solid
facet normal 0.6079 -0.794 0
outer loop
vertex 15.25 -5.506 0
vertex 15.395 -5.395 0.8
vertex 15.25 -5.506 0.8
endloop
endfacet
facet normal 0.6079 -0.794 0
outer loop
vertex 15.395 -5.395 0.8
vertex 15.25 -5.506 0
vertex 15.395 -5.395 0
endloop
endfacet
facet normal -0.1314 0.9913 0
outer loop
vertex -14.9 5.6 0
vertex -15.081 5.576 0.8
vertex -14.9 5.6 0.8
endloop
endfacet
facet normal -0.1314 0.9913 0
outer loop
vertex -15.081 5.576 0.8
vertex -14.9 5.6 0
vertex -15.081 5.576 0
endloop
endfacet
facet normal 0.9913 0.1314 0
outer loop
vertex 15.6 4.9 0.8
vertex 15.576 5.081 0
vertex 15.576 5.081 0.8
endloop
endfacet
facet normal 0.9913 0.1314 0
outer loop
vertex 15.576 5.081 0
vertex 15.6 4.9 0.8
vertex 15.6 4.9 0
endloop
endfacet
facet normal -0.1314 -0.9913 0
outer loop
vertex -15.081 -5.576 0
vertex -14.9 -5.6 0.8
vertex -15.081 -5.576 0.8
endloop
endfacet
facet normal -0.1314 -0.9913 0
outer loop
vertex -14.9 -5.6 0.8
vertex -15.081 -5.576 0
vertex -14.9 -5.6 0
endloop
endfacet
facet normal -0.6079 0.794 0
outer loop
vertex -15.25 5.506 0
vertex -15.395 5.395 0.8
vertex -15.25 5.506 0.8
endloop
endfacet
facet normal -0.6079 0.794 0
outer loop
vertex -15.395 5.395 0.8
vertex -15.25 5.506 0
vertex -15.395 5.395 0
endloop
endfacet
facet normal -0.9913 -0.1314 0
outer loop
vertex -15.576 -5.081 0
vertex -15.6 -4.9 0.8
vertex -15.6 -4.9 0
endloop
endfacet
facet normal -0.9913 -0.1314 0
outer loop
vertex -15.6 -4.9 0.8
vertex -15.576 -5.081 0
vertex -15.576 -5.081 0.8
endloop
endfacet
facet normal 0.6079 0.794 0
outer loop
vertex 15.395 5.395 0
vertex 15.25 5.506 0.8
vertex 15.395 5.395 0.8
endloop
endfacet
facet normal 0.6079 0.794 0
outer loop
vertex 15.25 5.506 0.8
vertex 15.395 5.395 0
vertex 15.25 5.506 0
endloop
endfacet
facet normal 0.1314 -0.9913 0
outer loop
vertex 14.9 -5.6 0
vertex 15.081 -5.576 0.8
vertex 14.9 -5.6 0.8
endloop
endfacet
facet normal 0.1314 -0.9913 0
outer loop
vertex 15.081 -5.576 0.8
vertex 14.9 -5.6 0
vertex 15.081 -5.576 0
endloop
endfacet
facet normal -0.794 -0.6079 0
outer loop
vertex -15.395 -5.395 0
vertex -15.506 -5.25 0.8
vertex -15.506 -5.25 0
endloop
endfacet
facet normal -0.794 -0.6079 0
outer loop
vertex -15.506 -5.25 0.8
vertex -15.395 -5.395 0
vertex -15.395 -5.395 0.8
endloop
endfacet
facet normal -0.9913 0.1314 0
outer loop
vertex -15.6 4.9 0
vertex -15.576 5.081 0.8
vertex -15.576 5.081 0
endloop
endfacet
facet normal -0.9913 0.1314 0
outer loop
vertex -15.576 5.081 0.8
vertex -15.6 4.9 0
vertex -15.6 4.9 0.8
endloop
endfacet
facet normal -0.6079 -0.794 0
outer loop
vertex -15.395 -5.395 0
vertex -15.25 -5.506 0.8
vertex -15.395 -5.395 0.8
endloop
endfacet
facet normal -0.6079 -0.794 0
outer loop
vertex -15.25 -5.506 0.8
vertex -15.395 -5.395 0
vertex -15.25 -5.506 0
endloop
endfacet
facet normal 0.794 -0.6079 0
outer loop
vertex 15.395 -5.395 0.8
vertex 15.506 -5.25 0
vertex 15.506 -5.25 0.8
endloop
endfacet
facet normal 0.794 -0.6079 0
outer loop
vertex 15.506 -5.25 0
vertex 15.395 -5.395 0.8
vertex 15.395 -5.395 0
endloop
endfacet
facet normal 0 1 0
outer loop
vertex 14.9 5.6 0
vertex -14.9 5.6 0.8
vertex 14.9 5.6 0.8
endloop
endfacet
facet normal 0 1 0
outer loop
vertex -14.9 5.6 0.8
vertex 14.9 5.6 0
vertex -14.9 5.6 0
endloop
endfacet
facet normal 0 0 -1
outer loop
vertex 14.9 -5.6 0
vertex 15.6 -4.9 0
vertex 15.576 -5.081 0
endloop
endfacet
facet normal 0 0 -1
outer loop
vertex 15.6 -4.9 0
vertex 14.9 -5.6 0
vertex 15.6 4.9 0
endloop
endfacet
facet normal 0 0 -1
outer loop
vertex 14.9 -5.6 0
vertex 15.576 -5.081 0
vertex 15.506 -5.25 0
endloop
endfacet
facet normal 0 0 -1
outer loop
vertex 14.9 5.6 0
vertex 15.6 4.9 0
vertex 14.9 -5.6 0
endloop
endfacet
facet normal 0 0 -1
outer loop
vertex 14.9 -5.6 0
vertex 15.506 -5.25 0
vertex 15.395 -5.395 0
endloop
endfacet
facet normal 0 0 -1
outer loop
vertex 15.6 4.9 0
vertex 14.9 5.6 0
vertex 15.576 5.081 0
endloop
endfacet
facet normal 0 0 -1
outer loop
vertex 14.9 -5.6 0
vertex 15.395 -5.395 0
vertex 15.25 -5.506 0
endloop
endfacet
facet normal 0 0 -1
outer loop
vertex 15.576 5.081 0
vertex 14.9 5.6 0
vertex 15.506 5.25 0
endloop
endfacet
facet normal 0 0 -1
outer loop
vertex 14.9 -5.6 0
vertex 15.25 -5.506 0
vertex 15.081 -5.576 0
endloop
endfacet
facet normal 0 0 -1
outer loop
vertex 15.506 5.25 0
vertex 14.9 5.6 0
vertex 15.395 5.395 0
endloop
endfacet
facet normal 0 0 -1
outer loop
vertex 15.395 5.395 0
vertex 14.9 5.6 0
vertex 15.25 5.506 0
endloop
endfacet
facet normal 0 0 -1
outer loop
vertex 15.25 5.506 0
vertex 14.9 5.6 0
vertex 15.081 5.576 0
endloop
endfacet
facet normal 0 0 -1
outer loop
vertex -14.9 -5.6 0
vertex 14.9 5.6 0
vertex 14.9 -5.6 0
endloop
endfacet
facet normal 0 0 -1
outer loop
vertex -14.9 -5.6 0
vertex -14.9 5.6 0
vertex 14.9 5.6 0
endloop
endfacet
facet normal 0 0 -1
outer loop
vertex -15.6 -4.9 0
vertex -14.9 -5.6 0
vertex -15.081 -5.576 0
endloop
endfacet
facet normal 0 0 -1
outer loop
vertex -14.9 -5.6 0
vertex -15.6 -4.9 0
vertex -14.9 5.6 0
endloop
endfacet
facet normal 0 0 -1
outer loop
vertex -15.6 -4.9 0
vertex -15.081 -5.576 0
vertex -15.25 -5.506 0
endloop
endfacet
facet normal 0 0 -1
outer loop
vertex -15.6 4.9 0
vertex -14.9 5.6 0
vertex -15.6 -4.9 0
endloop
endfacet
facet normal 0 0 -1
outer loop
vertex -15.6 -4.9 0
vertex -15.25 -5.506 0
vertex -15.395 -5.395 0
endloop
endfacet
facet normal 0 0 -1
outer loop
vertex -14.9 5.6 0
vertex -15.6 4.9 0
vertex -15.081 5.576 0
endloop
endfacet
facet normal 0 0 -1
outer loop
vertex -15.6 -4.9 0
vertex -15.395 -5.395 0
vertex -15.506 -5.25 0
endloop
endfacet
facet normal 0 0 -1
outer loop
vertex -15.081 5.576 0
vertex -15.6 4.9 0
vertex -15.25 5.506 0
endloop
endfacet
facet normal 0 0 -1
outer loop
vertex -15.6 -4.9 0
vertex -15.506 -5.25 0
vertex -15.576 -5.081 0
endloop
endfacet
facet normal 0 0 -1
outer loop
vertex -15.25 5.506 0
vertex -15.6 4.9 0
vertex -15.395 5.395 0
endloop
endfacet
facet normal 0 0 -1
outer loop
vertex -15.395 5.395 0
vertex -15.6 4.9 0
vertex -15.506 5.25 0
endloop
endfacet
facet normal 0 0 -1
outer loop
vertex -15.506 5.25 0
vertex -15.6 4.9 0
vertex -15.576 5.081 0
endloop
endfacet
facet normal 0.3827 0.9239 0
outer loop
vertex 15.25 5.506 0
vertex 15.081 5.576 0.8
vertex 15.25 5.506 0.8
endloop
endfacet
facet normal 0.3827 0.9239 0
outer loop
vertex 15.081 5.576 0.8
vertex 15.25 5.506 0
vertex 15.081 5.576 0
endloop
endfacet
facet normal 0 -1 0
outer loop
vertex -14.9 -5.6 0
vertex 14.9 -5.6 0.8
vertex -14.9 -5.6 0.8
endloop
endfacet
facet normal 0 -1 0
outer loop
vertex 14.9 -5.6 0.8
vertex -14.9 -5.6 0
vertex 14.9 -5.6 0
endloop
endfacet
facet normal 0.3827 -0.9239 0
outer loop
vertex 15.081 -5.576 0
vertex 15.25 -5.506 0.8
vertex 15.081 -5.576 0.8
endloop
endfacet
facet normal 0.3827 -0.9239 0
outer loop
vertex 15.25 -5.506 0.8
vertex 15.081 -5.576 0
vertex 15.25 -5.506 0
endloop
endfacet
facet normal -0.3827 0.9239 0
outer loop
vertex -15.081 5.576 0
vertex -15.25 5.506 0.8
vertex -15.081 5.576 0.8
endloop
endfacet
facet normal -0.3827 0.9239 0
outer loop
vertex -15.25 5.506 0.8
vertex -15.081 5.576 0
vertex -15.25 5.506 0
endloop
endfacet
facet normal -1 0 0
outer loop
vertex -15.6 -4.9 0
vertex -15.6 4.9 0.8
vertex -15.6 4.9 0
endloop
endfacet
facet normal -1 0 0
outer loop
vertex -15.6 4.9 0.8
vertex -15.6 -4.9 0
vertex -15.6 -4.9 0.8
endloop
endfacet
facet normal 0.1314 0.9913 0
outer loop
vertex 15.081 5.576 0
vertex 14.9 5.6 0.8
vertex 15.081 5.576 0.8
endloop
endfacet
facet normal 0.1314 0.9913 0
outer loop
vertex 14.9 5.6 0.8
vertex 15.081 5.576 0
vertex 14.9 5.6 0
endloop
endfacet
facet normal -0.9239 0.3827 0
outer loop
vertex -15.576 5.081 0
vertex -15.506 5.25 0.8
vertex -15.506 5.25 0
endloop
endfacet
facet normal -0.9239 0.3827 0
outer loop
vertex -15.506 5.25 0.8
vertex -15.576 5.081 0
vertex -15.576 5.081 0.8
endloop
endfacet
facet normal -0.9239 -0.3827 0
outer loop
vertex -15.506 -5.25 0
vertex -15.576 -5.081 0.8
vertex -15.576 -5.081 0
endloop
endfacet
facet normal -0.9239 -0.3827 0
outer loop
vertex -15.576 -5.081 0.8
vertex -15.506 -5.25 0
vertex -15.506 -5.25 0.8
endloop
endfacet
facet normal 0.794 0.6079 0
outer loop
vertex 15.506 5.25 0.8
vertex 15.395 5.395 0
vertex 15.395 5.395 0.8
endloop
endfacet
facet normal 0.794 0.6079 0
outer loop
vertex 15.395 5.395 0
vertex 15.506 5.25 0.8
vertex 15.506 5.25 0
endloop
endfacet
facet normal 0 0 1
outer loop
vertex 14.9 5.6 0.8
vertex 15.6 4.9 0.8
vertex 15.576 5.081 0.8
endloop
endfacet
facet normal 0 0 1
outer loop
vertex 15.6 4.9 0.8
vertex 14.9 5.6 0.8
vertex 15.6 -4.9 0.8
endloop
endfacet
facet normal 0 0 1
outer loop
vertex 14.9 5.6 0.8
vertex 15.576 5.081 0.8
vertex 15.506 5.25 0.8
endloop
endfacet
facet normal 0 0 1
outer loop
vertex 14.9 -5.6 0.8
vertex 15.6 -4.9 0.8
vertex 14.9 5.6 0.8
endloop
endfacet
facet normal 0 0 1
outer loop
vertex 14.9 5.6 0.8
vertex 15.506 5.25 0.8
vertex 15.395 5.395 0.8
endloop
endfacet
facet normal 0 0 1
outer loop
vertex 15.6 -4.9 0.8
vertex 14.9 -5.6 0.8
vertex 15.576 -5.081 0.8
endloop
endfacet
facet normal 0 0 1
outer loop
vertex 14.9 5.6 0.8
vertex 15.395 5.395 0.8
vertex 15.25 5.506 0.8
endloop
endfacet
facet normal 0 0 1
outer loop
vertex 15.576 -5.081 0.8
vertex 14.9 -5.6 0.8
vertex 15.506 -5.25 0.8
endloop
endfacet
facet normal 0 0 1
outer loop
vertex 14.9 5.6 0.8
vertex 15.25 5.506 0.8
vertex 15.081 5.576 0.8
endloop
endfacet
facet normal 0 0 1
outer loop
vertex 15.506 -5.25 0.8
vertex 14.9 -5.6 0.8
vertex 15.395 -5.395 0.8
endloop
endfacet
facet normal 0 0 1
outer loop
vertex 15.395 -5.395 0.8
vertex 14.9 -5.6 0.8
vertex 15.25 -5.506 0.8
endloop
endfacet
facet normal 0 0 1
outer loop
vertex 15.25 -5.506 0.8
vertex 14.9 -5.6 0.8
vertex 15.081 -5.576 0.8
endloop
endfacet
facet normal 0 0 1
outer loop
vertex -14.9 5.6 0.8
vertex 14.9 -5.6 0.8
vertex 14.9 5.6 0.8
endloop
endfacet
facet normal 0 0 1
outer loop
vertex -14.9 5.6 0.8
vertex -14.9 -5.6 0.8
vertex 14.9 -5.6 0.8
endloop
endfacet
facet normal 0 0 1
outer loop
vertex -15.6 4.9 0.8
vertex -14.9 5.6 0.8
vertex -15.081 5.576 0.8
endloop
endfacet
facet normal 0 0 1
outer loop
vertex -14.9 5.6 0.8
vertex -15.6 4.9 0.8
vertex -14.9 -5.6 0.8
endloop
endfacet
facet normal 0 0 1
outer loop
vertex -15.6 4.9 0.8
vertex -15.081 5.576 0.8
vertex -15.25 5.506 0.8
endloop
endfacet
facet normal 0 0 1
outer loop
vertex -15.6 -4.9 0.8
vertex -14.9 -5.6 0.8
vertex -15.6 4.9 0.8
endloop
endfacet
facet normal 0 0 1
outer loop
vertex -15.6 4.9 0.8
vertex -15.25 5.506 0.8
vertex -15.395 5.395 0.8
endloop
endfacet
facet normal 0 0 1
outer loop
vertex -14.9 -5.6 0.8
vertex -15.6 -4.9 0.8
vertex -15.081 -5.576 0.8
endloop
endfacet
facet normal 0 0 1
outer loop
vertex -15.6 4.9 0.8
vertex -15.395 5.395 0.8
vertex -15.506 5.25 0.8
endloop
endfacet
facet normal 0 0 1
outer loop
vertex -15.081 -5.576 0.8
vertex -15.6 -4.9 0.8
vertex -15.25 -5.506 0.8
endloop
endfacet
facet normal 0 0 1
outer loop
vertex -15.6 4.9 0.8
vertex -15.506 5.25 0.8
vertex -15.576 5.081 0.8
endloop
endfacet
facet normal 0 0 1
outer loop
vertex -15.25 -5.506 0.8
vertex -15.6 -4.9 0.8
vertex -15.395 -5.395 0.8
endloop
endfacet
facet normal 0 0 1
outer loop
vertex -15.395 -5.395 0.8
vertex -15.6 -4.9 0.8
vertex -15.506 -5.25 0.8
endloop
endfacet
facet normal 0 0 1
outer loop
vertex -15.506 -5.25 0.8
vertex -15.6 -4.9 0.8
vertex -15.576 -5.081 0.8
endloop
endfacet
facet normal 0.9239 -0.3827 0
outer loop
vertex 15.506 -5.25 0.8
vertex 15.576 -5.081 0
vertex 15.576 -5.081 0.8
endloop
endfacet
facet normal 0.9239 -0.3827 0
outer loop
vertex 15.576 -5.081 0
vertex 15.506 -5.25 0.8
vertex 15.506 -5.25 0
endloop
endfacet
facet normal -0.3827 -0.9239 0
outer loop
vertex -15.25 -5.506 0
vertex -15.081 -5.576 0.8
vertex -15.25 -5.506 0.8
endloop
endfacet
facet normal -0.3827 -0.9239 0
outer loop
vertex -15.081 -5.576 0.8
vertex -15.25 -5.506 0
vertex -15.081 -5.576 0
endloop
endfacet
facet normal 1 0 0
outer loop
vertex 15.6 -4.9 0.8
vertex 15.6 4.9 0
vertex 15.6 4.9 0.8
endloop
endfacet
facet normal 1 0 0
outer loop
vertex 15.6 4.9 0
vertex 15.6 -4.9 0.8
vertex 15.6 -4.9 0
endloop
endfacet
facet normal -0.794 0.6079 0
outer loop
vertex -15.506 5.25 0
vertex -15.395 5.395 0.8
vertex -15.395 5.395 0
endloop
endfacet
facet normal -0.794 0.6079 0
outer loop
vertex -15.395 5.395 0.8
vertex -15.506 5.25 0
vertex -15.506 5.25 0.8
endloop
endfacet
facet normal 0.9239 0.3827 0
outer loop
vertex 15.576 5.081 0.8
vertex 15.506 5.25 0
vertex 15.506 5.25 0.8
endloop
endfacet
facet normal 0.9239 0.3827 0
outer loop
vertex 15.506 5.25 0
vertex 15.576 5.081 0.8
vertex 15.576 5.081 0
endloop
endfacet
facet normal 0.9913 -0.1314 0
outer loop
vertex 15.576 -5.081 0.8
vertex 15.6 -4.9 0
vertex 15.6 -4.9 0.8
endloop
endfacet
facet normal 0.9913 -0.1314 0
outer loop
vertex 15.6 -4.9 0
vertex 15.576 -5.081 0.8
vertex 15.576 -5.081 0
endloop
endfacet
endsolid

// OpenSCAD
// Soft Frame drawer label: MakerWorld customizer (OnBrandCraftz, 2026-11-12).
// Type your own text; it is inlaid flush in a second colour and sized to fit the
// drawer's label window. The label is the shipped blank's exact size, 31.2 x 11.2 x
// 0.8 mm, so it slides into the same pocket. Print flat, text up, supports off,
// 0.2 mm layers.

/* [Your label] */
// The text on the label (one line; long text gets smaller, then narrower)
LABEL_TEXT = "Screws";

/* [Colours] */
// The label
LABEL_COLOUR = "#F4F1EA"; // color
// The text
TEXT_COLOUR = "#2E3440"; // color

/* [Hidden] */
// Why these numbers (Soft_Frame.scad):
// - The pocket is 32 x 12 x 1.5 and its front window 30 x 10. The label stays the
//   blank's 31.2 x 11.2 x 0.8, so the fit is unchanged.
// - The text is a flush inlay, the top two layers (0.4 mm), not raised: nothing
//   stands proud to catch the window's edge as the label slides down the pocket.
// - The text box is 26 x 7 mm, inside the window with 2 mm a side spare. It is
//   centred in the window even when the label sits 0.4 to one side of its pocket.
// - Montserrat Bold, which MakerWorld's Parametric Model Maker has: an unknown
//   font draws nothing and gives no error (the Name Ornament, 2026-11-05).
// - The width rule uses Montserrat Bold's own advances, measured in OpenSCAD
//   (PMM's build may not have textmetrics()). Down to cap height 3 mm the text
//   shrinks; past that it is narrowed, because thinner strokes stop printing
//   cleanly in two 0.4 mm-nozzle layers.
LABEL_W = 31.2; LABEL_H = 11.2; LABEL_T = 0.8; CORNER = 0.7;
INLAY = 0.4;
BOX_W = 26; BOX_H = 7;
FONT = "Montserrat:style=Bold";
SIZE_MAX = 5.0;   // cap height 4.9 mm; with descenders the line is 6.3 tall
SIZE_MIN = 3.0;
CHARS = "ABCDEFGHIJKLMNOPQRSTUVWXYZabcdefghijklmnopqrstuvwxyz0123456789 -'.!&#/+:()";
ADV = [1.0389, 1.0376, 0.982, 1.1203, 0.9101, 0.8667, 1.0457, 1.0959, 0.4449, 0.7338, 1.0037, 0.8192, 1.2953,
       1.0959, 1.1447, 0.9793, 1.1447, 0.9969, 0.8653, 0.8382, 1.0688, 0.9711, 1.5367, 0.9142, 0.887, 0.9101,
       0.8369, 0.9359, 0.8016, 0.9386, 0.8558, 0.5249, 0.9494, 0.9372, 0.4083, 0.4435, 0.8884, 0.4083, 1.4228,
       0.9372, 0.8884, 0.9359, 0.9359, 0.5756, 0.7202, 0.59, 0.9318, 0.8111, 1.2709, 0.807, 0.8111, 0.7365,
       0.9209, 0.5317, 0.8002, 0.8029, 0.9345, 0.807, 0.864, 0.8409, 0.8952, 0.864, 0.3838, 0.5235, 0.3119,
       0.3554, 0.392, 0.9874, 0.9766, 0.5317, 0.8125, 0.3554, 0.4842, 0.4856];
function adv(c) = let (i = search(c, CHARS)) len(i) && i[0] != [] ? ADV[i[0]] : 1.0;
function txt_w(s, n) = n <= 0 ? 0 : txt_w(s, n - 1) + adv(s[n - 1]);
W1 = max(0.01, txt_w(LABEL_TEXT, len(LABEL_TEXT)));    // width at size 1
SIZE = max(SIZE_MIN, min(SIZE_MAX, BOX_W / W1, BOX_H / 1.29));
SQUEEZE = min(1, BOX_W / (W1 * SIZE));

module rounded_rect(w, h, r) offset(r = r, $fn = 24) square([w - 2 * r, h - 2 * r], center = true);
module words() scale([SQUEEZE, 1])
    text(LABEL_TEXT, size = SIZE, font = FONT, halign = "center", valign = "center", $fn = 32);
// the text, clipped to its box so nothing ever reaches the label's edge
module words_clipped() intersection() { words(); square([BOX_W + 1, BOX_H + 1], center = true); }

module label_body() difference() {
    linear_extrude(LABEL_T) rounded_rect(LABEL_W, LABEL_H, CORNER);
    translate([0, 0, LABEL_T - INLAY]) linear_extrude(1) words_clipped();
}
module label_text() translate([0, 0, LABEL_T - INLAY]) linear_extrude(INLAY) words_clipped();

// ---- what MakerWorld exports: two colours, centred on (0, 0) ----
color(LABEL_COLOUR) label_body();
color(TEXT_COLOUR) label_text();
